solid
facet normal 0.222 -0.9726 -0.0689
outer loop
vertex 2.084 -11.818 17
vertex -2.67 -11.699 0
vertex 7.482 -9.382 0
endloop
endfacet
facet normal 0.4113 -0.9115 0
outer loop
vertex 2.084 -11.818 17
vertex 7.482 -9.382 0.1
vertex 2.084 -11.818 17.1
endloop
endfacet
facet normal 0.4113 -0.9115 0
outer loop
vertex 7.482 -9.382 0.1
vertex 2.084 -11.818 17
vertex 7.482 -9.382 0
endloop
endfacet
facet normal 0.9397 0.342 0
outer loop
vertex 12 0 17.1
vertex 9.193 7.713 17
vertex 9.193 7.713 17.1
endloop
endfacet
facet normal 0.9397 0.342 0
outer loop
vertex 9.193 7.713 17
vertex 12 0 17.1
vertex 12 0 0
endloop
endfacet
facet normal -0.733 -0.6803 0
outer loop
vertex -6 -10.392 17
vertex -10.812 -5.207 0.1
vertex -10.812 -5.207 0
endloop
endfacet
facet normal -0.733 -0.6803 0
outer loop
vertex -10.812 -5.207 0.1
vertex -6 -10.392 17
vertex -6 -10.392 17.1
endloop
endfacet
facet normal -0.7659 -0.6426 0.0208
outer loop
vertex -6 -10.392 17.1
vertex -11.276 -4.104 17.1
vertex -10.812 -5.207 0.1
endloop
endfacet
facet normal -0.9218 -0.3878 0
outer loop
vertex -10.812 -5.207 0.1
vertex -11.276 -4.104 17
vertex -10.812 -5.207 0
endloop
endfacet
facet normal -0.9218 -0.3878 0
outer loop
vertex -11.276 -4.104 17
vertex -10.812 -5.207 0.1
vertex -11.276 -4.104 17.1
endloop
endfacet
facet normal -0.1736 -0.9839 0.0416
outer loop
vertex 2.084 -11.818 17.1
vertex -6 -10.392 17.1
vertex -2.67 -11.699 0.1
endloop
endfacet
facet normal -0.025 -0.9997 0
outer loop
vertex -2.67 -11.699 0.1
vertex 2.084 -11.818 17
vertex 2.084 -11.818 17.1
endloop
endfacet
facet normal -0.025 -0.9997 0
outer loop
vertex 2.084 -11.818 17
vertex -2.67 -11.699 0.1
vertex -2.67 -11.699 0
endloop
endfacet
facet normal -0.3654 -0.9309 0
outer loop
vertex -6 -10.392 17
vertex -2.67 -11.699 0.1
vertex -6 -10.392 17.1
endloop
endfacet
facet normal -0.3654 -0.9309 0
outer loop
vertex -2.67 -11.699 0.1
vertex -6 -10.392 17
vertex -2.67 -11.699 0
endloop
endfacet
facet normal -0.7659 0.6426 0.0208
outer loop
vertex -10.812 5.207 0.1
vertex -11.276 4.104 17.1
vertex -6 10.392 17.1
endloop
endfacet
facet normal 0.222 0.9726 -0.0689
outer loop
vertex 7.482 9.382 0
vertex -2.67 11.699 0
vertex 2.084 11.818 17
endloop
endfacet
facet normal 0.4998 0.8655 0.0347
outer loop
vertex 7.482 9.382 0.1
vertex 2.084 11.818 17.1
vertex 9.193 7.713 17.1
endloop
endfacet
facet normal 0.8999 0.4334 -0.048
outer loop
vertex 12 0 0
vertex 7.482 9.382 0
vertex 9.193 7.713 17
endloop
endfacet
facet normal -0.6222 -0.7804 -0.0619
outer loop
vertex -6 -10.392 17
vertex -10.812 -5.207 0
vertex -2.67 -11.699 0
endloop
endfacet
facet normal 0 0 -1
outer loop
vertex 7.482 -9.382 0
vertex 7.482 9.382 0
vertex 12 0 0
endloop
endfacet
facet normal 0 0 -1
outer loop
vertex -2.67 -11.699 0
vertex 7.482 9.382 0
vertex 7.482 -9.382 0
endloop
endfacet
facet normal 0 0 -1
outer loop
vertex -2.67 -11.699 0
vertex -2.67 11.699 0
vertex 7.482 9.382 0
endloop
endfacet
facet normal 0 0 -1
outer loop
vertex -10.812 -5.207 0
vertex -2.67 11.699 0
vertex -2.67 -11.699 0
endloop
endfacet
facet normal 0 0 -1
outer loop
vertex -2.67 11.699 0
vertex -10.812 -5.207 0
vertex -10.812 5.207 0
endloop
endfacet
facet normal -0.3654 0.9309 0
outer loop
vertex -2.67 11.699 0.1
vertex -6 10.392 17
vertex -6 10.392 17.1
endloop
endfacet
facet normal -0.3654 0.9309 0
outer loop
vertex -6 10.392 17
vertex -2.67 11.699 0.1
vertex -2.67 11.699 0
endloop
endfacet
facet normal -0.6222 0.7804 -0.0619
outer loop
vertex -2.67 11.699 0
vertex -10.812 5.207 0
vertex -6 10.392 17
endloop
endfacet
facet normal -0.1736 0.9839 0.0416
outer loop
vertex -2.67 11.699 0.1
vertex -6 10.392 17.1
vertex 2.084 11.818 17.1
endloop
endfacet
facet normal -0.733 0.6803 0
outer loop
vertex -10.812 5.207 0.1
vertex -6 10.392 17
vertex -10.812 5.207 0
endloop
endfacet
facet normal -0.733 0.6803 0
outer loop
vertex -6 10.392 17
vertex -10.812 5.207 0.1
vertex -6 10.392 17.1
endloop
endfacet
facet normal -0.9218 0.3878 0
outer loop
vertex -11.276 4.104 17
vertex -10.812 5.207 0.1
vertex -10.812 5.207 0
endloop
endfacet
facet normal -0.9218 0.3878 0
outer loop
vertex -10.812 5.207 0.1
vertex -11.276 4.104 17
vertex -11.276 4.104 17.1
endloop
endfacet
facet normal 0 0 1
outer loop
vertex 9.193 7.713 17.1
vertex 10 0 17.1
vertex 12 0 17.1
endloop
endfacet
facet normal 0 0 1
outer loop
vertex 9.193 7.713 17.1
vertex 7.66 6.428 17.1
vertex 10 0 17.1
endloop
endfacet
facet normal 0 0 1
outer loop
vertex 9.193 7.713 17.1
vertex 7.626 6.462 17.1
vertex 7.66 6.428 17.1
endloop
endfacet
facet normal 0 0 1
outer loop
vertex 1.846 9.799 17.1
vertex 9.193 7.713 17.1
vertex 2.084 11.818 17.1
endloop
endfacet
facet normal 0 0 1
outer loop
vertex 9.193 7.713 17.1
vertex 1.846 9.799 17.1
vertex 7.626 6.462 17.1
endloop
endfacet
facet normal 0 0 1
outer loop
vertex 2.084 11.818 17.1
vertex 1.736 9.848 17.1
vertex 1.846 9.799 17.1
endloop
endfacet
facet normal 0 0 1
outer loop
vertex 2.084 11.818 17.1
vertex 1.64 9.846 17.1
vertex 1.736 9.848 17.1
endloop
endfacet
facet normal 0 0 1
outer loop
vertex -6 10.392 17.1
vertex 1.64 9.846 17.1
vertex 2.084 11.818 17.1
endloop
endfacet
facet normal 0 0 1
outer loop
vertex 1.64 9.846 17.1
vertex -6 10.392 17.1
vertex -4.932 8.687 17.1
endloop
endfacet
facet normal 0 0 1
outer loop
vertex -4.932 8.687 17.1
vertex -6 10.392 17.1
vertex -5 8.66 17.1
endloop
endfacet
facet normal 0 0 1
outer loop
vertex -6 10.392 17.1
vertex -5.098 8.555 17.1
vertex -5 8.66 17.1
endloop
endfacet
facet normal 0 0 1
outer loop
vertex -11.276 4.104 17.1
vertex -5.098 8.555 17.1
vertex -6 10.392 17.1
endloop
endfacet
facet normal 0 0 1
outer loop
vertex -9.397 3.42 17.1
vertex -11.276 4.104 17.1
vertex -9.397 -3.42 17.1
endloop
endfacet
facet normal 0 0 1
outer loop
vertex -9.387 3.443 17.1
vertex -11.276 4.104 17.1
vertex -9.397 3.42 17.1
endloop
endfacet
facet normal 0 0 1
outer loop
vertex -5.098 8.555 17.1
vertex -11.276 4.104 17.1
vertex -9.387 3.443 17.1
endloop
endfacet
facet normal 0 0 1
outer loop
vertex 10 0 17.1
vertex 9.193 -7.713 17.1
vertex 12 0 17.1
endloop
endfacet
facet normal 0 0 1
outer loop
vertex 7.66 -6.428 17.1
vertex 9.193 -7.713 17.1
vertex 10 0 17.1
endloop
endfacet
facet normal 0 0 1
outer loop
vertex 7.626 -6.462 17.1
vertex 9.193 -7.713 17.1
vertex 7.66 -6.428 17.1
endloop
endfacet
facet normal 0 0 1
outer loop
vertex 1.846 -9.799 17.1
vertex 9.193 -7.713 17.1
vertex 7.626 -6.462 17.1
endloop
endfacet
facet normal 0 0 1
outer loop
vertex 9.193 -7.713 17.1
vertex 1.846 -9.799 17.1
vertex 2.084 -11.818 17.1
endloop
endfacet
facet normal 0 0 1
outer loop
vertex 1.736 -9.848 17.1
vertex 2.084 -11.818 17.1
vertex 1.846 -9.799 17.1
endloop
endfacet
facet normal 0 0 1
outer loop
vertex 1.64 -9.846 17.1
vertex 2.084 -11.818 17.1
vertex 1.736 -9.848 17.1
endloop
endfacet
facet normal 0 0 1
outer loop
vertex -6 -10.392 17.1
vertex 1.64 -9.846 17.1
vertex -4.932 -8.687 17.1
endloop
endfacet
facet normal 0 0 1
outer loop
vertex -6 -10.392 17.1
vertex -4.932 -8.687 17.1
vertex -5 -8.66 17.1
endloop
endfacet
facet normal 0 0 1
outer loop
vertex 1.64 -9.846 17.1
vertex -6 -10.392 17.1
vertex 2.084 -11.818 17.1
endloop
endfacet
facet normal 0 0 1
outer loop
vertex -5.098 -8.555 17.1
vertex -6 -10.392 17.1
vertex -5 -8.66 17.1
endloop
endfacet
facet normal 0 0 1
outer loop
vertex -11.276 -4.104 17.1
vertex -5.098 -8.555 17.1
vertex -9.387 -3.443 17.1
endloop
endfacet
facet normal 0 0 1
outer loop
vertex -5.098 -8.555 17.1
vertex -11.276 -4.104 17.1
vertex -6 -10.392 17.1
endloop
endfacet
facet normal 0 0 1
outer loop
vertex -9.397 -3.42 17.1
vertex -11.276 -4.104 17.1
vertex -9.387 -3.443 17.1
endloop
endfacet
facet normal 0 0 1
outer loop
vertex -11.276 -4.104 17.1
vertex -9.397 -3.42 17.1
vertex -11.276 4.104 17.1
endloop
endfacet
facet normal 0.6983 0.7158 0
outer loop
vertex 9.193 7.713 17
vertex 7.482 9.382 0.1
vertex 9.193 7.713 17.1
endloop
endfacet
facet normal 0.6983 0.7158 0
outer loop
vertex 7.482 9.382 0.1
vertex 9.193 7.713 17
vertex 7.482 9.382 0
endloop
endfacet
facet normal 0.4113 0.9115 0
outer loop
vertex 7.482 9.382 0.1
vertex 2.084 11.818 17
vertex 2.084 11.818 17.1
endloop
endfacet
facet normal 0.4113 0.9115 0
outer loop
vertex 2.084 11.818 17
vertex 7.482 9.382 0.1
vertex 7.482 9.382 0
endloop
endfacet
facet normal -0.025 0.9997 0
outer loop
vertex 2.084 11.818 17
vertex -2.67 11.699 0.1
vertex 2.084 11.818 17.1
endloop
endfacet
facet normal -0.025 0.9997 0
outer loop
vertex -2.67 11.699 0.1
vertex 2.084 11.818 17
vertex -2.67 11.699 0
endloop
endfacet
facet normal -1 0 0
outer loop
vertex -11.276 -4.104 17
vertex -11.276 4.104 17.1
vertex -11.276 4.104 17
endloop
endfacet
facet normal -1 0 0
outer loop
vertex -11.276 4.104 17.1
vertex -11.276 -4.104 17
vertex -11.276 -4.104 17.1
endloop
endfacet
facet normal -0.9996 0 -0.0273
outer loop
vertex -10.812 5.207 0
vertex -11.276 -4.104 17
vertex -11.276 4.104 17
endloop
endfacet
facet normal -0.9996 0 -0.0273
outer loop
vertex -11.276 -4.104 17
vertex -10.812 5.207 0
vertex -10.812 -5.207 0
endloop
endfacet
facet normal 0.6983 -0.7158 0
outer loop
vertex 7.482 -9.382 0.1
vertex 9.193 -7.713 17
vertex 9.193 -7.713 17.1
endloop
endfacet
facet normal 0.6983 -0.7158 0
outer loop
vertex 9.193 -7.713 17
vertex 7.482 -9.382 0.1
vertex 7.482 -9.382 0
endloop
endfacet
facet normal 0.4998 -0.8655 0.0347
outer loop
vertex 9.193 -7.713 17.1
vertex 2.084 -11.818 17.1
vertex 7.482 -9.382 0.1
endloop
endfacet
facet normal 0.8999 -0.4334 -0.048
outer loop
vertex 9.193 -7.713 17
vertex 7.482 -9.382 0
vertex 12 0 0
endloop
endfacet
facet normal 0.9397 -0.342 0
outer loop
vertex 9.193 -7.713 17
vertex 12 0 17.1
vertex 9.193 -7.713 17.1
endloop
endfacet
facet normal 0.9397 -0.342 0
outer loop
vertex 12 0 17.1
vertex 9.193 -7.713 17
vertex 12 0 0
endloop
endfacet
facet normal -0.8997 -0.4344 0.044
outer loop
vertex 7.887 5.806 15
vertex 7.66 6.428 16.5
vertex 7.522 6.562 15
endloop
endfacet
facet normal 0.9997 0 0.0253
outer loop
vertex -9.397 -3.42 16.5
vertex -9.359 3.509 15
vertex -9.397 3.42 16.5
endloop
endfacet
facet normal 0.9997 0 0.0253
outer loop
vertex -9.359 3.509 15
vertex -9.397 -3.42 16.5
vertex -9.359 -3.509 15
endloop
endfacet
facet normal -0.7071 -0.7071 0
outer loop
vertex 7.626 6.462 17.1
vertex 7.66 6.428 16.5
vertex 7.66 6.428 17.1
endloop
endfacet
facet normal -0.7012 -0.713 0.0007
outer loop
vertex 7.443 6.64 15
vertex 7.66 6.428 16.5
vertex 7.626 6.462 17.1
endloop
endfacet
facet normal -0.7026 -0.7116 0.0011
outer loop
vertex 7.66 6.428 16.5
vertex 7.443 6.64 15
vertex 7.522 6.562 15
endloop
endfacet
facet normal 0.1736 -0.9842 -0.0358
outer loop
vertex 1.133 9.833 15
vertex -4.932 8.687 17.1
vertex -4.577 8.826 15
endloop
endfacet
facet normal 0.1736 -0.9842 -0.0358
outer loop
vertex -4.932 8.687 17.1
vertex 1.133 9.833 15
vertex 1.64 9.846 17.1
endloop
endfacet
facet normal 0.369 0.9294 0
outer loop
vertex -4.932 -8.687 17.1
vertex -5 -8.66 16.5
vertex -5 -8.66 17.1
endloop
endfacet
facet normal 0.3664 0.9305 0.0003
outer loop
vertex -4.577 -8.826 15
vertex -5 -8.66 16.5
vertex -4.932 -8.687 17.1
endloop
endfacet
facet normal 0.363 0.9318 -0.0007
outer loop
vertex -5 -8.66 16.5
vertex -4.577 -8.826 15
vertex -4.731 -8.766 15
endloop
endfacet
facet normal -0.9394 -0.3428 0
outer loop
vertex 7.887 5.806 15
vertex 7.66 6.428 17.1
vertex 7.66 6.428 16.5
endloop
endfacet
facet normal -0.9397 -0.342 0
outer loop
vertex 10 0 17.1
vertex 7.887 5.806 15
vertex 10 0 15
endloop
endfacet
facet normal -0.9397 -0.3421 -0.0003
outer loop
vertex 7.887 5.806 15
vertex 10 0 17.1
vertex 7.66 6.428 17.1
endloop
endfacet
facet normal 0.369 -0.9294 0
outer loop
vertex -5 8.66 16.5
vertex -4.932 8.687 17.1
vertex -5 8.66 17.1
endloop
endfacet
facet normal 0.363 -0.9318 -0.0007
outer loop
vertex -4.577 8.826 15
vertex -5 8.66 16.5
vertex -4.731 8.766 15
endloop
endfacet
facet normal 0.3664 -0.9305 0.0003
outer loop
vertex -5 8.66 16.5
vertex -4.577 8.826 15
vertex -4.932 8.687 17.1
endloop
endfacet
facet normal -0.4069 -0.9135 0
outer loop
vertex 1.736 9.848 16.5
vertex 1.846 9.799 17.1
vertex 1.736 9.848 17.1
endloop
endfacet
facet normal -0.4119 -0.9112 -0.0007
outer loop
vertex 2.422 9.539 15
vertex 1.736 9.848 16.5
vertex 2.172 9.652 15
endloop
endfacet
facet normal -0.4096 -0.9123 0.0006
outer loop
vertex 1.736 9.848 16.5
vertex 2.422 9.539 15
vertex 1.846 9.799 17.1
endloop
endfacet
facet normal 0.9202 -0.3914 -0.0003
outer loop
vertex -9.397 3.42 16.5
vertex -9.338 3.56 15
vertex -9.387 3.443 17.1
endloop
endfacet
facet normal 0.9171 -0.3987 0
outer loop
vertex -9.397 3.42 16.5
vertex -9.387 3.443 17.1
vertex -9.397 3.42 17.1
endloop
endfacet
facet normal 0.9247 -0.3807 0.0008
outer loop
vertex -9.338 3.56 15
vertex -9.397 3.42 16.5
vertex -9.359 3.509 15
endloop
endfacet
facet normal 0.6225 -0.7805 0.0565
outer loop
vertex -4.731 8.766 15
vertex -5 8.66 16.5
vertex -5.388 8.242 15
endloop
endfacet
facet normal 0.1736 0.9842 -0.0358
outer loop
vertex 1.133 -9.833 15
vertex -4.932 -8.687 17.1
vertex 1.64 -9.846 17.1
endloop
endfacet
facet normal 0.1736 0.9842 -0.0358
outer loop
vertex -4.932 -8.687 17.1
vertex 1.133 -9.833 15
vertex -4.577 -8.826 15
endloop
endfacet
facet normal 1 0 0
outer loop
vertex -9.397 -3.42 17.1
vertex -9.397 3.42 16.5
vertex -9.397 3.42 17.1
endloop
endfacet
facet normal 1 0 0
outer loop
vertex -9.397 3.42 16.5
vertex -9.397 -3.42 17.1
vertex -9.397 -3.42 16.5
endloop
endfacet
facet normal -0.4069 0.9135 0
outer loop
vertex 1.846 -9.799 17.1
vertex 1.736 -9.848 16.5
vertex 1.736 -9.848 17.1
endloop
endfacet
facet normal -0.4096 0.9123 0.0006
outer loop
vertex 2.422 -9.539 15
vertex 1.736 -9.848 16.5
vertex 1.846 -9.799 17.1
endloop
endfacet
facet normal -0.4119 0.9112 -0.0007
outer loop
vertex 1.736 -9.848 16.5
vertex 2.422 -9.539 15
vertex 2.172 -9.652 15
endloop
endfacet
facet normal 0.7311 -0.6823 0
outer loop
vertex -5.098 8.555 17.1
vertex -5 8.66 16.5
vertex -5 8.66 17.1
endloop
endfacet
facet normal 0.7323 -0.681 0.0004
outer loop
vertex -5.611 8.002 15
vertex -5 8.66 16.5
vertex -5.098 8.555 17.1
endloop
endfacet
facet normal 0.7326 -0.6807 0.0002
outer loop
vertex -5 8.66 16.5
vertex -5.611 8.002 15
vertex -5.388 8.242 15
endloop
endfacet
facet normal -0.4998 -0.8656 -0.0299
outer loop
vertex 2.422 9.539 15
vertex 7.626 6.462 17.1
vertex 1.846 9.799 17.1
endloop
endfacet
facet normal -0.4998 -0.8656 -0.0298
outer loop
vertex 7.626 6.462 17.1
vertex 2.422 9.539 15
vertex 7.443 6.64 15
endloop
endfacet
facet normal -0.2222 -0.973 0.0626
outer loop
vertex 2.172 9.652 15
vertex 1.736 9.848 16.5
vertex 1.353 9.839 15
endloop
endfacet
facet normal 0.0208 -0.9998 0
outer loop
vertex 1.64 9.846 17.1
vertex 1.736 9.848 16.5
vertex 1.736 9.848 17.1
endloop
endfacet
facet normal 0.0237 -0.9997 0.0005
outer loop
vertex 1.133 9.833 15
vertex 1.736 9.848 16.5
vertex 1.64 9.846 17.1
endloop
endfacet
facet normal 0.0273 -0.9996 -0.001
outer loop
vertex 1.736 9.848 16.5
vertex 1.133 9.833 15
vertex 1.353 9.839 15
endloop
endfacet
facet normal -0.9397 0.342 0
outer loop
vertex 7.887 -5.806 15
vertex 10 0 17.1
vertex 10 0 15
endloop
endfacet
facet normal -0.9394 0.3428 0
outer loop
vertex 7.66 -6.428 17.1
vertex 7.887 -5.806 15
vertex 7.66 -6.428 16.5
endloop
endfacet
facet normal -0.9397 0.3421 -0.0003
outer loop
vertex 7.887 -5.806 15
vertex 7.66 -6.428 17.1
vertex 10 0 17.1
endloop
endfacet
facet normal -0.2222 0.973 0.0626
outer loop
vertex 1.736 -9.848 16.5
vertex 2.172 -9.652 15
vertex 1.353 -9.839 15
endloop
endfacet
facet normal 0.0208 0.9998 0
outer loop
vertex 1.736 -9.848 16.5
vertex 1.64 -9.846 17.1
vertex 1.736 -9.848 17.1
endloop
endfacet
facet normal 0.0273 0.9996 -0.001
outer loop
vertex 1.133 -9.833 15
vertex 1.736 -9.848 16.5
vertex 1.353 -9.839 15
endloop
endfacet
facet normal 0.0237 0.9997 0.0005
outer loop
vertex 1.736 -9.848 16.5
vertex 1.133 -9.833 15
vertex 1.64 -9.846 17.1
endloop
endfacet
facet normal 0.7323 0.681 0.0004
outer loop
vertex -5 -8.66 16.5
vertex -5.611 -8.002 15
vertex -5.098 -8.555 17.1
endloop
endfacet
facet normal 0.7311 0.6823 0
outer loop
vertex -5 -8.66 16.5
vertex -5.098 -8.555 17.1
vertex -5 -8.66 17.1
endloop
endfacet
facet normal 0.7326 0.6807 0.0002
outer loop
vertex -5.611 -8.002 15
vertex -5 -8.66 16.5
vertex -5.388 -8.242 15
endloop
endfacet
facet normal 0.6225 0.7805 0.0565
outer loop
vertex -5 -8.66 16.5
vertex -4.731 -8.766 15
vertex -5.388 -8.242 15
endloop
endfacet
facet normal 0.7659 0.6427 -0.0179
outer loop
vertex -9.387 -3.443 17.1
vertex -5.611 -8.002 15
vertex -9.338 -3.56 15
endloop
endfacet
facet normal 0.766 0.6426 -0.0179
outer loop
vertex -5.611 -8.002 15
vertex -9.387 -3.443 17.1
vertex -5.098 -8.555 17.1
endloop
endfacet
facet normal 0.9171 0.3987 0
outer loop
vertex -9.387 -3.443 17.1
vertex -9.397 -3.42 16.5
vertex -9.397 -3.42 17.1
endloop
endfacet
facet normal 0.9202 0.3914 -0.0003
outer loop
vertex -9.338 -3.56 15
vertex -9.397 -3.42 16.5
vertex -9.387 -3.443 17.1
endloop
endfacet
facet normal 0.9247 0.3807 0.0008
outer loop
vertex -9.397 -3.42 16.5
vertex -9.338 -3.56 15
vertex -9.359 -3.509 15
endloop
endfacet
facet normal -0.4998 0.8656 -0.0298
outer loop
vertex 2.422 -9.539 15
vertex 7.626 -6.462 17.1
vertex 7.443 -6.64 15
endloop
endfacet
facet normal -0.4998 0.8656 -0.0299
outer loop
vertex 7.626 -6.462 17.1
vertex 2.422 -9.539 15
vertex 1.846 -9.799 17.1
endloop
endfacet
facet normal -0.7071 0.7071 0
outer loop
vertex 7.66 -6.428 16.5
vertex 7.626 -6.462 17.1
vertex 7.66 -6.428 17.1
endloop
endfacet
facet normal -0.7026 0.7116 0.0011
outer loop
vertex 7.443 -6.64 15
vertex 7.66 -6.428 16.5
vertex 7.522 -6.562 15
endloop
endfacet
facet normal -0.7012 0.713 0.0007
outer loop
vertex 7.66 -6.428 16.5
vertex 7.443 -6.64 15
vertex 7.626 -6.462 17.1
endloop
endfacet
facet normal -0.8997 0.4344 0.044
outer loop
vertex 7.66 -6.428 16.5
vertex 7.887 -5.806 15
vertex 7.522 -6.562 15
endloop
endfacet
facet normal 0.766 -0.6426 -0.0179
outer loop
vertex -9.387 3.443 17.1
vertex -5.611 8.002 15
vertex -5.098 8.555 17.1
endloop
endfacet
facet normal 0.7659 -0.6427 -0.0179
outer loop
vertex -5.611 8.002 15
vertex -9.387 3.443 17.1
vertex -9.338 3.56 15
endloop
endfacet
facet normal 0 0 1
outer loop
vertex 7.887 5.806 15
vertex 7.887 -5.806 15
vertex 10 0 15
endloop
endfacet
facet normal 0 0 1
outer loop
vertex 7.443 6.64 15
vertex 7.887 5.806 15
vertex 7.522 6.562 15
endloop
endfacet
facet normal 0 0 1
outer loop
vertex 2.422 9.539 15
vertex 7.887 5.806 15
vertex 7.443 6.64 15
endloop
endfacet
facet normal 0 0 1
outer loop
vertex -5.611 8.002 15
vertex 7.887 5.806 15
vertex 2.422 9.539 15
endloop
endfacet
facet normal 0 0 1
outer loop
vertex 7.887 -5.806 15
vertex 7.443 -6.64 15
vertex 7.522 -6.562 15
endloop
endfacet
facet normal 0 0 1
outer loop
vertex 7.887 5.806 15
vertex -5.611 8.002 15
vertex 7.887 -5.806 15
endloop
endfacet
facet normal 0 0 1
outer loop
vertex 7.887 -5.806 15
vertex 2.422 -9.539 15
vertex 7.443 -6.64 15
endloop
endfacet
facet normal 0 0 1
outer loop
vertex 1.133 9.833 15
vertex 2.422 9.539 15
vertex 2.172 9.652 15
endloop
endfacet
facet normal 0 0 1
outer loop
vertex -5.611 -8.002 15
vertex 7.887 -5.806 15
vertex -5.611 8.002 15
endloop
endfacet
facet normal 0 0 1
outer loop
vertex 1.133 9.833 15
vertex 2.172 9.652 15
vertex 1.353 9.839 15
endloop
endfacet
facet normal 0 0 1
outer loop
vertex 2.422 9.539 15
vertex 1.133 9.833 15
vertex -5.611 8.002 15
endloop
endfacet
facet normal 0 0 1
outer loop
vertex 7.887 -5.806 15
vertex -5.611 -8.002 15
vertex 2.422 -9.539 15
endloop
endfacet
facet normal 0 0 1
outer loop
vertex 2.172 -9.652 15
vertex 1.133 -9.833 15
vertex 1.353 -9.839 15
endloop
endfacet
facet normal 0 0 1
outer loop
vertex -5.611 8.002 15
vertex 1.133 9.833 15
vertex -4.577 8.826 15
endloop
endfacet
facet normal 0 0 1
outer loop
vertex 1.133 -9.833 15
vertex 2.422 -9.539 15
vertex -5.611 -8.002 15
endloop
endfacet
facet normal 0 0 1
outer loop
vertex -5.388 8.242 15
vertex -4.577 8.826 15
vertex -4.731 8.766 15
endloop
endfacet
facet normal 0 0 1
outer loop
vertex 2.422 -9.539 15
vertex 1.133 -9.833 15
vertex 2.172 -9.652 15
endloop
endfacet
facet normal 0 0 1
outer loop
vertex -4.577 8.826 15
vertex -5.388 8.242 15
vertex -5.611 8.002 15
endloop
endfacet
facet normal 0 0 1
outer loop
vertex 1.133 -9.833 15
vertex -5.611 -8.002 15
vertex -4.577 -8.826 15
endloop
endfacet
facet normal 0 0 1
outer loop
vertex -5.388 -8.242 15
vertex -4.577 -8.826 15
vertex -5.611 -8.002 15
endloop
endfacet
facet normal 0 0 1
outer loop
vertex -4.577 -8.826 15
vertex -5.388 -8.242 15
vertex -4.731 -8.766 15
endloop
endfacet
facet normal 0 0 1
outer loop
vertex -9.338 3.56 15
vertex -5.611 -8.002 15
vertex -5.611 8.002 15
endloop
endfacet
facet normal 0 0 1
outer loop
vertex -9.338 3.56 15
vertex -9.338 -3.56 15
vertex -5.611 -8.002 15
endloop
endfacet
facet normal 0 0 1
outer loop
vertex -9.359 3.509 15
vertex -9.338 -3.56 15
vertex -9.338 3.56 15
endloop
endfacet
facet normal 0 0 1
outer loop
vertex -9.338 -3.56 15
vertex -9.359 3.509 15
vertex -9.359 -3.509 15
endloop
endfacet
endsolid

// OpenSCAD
// flowerpot

// some random values

corners_start = floor(rands(3,10,1)[0]);
corners_end = floor(rands(3,10,1)[0]);
radius_start = floor(rands(10,15,1)[0]);
radius_end = floor(rands(10,15,1)[0]);
hight = floor(rands(15,20,1)[0]);

echo("id ", corners_start, corners_end, radius_start, radius_end, hight);

color("#ffffff")
difference(){
    hull(){
        cylinder(r = radius_start, h=0.1, $fn = corners_start);
        translate([0,0,hight])
            cylinder(r = radius_end, h=0.1, $fn = corners_end);
    };
    translate([0,0,1])
        hull(){
            cylinder(r = radius_start-2, h=0.1, $fn = corners_start);
            translate([0,0,hight-1])
                cylinder(r = radius_end-2, h=0.1, $fn = corners_end);
            translate([0,0,hight-1.5])
                cylinder(r = radius_end-2, h=1, $fn = corners_end);
        };
};

color("#ff0000")
difference(){
    translate([0,0,1])
        hull(){
            cylinder(r = radius_start-2, h=0.1, $fn = corners_start);
            translate([0,0,hight-1])
                cylinder(r = radius_end-2, h=0.1, $fn = corners_end);
            translate([0,0,hight-1.5])
                cylinder(r = radius_end-2, h=1, $fn = corners_end);
        };
   translate([0,0,hight-2]) cylinder(r = radius_end, h=3, $fn = corners_end);
};
